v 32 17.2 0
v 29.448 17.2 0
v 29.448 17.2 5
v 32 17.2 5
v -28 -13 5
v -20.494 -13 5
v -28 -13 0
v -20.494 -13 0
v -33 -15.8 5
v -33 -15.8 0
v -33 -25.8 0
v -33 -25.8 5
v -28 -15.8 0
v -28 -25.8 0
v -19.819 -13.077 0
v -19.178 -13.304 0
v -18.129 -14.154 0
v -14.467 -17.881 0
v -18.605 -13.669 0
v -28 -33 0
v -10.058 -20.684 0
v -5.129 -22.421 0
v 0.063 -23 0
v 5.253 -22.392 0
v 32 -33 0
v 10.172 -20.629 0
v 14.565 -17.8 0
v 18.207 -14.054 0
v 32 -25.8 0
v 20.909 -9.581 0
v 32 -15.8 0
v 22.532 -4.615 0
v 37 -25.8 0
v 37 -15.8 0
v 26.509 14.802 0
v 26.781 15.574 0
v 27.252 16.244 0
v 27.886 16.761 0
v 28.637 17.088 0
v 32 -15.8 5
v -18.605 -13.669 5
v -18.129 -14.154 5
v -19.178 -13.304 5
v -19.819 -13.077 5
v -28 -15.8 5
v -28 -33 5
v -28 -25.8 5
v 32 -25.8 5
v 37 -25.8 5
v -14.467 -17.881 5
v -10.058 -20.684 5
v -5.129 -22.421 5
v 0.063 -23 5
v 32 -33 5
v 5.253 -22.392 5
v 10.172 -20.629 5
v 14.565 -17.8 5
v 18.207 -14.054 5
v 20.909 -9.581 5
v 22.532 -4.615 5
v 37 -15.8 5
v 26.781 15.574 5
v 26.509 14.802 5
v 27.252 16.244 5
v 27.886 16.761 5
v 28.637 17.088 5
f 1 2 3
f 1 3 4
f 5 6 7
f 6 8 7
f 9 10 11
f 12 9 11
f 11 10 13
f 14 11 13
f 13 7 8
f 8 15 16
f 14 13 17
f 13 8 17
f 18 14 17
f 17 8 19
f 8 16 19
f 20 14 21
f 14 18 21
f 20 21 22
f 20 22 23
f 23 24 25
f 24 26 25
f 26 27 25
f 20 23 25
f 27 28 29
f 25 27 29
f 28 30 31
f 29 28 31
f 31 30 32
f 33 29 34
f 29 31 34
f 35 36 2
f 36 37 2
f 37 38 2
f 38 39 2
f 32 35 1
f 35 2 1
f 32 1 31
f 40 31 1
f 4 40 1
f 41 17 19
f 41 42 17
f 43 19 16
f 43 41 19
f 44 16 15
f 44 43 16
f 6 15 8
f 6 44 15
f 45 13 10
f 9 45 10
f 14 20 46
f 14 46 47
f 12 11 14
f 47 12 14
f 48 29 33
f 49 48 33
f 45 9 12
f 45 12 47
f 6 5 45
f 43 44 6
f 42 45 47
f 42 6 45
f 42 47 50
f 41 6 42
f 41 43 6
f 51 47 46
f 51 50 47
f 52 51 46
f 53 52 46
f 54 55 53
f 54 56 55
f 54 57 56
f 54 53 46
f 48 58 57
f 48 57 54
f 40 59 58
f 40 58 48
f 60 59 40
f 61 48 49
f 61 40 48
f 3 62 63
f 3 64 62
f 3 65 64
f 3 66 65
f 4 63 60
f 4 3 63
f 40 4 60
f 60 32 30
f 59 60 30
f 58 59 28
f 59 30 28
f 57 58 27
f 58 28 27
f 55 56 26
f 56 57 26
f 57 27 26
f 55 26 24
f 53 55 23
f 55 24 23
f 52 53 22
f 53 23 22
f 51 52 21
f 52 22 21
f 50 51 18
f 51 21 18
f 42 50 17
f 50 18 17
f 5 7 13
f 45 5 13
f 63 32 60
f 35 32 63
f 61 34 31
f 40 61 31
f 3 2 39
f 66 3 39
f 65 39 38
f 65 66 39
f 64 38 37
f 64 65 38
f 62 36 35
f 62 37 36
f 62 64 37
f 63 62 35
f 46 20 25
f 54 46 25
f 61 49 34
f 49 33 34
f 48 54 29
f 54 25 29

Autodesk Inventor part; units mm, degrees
ref_plane "YZ Plane" through (0, 0, 0) normal (1, 0, 0) x (0, 1, 0)
ref_plane "XZ Plane" through (0, 0, 0) normal (0, 1, 0) x (-1, 0, 0)
ref_plane "XY Plane" through (0, 0, 0) normal (0, 0, 1) x (1, 0, 0)
sketch "Sketch1" plane through (0, 0, 0) normal (0, 0, 1) x (1, 0, 0)
  arc A0 (-18.9737, -13) -> (22.5323, -4.6147) centre (0, 0) ccw
  circle A1 centre (0, 0) radius 23 construction
  line L0 (-28, 0) -> (-28, -39.6186) construction
  line L1 (-18.9737, -13) -> (-28, -13)
  line L2 (-28, -13) -> (-28, -15.8)
  line L3 (-28, -15.8) -> (-33, -15.8)
  line L4 (-33, -15.8) -> (-33, -25.8)
  line L5 (37, -25.8) -> (37, -15.8)
  line L6 (37, -15.8) -> (32, -15.8)
  line L7 (32, -15.8) -> (32, 17.2)
  line L8 (-33, -25.8) -> (-28, -25.8)
  line L9 (-28, -33) -> (-28, -25.8)
  line L10 (-28, -33) -> (32, -33)
  line L11 (32, -33) -> (32, -25.8)
  line L12 (32, -25.8) -> (37, -25.8)
  line L13 (0, 0) -> (-28, 0) construction
  line L14 (22.5323, -4.6147) -> (27, 17.2)
  line L15 (27, 17.2) -> (32, 17.2)
  dimension "d0" = 46
  dimension "d1" = 15.8
  dimension "d2" = 13
  dimension "d3" = 5
  dimension "d4" = 5
  dimension "d5" = 10
  dimension "d6" = 60
  dimension "d7" = 33
  dimension "d10" = 33
  dimension "d13" = 28
  dimension "d14" = 5
extrude "Extrusion1" add sketch "Sketch1" along normal blind 5
fillet "Fillet1" radius 3 2 edges at (-18.9737, -13, 2.5) (27, 17.2, 2.5)
equation "\"d4\" = d3"
properties part number "104.003.01_Endanschlag_Flasche"
